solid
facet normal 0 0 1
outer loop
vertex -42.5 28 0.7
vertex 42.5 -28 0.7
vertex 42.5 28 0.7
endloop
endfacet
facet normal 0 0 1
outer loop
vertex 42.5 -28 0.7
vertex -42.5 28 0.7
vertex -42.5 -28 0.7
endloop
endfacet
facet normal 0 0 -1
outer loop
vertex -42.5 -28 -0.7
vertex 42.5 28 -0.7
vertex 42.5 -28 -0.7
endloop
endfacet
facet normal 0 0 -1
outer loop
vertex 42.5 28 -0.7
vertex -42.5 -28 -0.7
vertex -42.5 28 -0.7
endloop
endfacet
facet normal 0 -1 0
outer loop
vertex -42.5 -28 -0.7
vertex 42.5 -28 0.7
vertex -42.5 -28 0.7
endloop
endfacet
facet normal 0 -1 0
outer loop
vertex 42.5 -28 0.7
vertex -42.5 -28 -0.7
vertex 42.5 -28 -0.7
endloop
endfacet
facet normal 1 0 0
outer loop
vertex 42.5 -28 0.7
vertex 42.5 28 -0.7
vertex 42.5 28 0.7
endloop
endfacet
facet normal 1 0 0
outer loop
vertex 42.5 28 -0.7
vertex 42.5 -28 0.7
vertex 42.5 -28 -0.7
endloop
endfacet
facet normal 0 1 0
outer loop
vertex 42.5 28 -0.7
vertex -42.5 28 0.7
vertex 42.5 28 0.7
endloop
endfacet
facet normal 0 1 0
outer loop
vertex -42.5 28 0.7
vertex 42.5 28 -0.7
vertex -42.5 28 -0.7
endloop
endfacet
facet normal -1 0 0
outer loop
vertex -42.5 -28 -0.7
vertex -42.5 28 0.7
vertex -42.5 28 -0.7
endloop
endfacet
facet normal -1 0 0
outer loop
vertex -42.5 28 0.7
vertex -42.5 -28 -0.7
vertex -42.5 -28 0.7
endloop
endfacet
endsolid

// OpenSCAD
// Parameters
pcb_length = 85.0; //[42.5:170.0:0.5]
pcb_width = 56.0; //[28.0:112.0:0.5]
pcb_thickness = 1.4; //[0.7:2.8:0.1]

// Main PCB Body
module pcb_main_body() {
  color([0.0, 0.4, 0.2]) // Green color for PCB
  translate([0, 0, 0])
    cube([pcb_length, pcb_width, pcb_thickness], center=true);
}

// Complete SBC Model
module sbc_complete_model() {
  union() {
    pcb_main_body();
  }
}

// Render the final model
sbc_complete_model();
